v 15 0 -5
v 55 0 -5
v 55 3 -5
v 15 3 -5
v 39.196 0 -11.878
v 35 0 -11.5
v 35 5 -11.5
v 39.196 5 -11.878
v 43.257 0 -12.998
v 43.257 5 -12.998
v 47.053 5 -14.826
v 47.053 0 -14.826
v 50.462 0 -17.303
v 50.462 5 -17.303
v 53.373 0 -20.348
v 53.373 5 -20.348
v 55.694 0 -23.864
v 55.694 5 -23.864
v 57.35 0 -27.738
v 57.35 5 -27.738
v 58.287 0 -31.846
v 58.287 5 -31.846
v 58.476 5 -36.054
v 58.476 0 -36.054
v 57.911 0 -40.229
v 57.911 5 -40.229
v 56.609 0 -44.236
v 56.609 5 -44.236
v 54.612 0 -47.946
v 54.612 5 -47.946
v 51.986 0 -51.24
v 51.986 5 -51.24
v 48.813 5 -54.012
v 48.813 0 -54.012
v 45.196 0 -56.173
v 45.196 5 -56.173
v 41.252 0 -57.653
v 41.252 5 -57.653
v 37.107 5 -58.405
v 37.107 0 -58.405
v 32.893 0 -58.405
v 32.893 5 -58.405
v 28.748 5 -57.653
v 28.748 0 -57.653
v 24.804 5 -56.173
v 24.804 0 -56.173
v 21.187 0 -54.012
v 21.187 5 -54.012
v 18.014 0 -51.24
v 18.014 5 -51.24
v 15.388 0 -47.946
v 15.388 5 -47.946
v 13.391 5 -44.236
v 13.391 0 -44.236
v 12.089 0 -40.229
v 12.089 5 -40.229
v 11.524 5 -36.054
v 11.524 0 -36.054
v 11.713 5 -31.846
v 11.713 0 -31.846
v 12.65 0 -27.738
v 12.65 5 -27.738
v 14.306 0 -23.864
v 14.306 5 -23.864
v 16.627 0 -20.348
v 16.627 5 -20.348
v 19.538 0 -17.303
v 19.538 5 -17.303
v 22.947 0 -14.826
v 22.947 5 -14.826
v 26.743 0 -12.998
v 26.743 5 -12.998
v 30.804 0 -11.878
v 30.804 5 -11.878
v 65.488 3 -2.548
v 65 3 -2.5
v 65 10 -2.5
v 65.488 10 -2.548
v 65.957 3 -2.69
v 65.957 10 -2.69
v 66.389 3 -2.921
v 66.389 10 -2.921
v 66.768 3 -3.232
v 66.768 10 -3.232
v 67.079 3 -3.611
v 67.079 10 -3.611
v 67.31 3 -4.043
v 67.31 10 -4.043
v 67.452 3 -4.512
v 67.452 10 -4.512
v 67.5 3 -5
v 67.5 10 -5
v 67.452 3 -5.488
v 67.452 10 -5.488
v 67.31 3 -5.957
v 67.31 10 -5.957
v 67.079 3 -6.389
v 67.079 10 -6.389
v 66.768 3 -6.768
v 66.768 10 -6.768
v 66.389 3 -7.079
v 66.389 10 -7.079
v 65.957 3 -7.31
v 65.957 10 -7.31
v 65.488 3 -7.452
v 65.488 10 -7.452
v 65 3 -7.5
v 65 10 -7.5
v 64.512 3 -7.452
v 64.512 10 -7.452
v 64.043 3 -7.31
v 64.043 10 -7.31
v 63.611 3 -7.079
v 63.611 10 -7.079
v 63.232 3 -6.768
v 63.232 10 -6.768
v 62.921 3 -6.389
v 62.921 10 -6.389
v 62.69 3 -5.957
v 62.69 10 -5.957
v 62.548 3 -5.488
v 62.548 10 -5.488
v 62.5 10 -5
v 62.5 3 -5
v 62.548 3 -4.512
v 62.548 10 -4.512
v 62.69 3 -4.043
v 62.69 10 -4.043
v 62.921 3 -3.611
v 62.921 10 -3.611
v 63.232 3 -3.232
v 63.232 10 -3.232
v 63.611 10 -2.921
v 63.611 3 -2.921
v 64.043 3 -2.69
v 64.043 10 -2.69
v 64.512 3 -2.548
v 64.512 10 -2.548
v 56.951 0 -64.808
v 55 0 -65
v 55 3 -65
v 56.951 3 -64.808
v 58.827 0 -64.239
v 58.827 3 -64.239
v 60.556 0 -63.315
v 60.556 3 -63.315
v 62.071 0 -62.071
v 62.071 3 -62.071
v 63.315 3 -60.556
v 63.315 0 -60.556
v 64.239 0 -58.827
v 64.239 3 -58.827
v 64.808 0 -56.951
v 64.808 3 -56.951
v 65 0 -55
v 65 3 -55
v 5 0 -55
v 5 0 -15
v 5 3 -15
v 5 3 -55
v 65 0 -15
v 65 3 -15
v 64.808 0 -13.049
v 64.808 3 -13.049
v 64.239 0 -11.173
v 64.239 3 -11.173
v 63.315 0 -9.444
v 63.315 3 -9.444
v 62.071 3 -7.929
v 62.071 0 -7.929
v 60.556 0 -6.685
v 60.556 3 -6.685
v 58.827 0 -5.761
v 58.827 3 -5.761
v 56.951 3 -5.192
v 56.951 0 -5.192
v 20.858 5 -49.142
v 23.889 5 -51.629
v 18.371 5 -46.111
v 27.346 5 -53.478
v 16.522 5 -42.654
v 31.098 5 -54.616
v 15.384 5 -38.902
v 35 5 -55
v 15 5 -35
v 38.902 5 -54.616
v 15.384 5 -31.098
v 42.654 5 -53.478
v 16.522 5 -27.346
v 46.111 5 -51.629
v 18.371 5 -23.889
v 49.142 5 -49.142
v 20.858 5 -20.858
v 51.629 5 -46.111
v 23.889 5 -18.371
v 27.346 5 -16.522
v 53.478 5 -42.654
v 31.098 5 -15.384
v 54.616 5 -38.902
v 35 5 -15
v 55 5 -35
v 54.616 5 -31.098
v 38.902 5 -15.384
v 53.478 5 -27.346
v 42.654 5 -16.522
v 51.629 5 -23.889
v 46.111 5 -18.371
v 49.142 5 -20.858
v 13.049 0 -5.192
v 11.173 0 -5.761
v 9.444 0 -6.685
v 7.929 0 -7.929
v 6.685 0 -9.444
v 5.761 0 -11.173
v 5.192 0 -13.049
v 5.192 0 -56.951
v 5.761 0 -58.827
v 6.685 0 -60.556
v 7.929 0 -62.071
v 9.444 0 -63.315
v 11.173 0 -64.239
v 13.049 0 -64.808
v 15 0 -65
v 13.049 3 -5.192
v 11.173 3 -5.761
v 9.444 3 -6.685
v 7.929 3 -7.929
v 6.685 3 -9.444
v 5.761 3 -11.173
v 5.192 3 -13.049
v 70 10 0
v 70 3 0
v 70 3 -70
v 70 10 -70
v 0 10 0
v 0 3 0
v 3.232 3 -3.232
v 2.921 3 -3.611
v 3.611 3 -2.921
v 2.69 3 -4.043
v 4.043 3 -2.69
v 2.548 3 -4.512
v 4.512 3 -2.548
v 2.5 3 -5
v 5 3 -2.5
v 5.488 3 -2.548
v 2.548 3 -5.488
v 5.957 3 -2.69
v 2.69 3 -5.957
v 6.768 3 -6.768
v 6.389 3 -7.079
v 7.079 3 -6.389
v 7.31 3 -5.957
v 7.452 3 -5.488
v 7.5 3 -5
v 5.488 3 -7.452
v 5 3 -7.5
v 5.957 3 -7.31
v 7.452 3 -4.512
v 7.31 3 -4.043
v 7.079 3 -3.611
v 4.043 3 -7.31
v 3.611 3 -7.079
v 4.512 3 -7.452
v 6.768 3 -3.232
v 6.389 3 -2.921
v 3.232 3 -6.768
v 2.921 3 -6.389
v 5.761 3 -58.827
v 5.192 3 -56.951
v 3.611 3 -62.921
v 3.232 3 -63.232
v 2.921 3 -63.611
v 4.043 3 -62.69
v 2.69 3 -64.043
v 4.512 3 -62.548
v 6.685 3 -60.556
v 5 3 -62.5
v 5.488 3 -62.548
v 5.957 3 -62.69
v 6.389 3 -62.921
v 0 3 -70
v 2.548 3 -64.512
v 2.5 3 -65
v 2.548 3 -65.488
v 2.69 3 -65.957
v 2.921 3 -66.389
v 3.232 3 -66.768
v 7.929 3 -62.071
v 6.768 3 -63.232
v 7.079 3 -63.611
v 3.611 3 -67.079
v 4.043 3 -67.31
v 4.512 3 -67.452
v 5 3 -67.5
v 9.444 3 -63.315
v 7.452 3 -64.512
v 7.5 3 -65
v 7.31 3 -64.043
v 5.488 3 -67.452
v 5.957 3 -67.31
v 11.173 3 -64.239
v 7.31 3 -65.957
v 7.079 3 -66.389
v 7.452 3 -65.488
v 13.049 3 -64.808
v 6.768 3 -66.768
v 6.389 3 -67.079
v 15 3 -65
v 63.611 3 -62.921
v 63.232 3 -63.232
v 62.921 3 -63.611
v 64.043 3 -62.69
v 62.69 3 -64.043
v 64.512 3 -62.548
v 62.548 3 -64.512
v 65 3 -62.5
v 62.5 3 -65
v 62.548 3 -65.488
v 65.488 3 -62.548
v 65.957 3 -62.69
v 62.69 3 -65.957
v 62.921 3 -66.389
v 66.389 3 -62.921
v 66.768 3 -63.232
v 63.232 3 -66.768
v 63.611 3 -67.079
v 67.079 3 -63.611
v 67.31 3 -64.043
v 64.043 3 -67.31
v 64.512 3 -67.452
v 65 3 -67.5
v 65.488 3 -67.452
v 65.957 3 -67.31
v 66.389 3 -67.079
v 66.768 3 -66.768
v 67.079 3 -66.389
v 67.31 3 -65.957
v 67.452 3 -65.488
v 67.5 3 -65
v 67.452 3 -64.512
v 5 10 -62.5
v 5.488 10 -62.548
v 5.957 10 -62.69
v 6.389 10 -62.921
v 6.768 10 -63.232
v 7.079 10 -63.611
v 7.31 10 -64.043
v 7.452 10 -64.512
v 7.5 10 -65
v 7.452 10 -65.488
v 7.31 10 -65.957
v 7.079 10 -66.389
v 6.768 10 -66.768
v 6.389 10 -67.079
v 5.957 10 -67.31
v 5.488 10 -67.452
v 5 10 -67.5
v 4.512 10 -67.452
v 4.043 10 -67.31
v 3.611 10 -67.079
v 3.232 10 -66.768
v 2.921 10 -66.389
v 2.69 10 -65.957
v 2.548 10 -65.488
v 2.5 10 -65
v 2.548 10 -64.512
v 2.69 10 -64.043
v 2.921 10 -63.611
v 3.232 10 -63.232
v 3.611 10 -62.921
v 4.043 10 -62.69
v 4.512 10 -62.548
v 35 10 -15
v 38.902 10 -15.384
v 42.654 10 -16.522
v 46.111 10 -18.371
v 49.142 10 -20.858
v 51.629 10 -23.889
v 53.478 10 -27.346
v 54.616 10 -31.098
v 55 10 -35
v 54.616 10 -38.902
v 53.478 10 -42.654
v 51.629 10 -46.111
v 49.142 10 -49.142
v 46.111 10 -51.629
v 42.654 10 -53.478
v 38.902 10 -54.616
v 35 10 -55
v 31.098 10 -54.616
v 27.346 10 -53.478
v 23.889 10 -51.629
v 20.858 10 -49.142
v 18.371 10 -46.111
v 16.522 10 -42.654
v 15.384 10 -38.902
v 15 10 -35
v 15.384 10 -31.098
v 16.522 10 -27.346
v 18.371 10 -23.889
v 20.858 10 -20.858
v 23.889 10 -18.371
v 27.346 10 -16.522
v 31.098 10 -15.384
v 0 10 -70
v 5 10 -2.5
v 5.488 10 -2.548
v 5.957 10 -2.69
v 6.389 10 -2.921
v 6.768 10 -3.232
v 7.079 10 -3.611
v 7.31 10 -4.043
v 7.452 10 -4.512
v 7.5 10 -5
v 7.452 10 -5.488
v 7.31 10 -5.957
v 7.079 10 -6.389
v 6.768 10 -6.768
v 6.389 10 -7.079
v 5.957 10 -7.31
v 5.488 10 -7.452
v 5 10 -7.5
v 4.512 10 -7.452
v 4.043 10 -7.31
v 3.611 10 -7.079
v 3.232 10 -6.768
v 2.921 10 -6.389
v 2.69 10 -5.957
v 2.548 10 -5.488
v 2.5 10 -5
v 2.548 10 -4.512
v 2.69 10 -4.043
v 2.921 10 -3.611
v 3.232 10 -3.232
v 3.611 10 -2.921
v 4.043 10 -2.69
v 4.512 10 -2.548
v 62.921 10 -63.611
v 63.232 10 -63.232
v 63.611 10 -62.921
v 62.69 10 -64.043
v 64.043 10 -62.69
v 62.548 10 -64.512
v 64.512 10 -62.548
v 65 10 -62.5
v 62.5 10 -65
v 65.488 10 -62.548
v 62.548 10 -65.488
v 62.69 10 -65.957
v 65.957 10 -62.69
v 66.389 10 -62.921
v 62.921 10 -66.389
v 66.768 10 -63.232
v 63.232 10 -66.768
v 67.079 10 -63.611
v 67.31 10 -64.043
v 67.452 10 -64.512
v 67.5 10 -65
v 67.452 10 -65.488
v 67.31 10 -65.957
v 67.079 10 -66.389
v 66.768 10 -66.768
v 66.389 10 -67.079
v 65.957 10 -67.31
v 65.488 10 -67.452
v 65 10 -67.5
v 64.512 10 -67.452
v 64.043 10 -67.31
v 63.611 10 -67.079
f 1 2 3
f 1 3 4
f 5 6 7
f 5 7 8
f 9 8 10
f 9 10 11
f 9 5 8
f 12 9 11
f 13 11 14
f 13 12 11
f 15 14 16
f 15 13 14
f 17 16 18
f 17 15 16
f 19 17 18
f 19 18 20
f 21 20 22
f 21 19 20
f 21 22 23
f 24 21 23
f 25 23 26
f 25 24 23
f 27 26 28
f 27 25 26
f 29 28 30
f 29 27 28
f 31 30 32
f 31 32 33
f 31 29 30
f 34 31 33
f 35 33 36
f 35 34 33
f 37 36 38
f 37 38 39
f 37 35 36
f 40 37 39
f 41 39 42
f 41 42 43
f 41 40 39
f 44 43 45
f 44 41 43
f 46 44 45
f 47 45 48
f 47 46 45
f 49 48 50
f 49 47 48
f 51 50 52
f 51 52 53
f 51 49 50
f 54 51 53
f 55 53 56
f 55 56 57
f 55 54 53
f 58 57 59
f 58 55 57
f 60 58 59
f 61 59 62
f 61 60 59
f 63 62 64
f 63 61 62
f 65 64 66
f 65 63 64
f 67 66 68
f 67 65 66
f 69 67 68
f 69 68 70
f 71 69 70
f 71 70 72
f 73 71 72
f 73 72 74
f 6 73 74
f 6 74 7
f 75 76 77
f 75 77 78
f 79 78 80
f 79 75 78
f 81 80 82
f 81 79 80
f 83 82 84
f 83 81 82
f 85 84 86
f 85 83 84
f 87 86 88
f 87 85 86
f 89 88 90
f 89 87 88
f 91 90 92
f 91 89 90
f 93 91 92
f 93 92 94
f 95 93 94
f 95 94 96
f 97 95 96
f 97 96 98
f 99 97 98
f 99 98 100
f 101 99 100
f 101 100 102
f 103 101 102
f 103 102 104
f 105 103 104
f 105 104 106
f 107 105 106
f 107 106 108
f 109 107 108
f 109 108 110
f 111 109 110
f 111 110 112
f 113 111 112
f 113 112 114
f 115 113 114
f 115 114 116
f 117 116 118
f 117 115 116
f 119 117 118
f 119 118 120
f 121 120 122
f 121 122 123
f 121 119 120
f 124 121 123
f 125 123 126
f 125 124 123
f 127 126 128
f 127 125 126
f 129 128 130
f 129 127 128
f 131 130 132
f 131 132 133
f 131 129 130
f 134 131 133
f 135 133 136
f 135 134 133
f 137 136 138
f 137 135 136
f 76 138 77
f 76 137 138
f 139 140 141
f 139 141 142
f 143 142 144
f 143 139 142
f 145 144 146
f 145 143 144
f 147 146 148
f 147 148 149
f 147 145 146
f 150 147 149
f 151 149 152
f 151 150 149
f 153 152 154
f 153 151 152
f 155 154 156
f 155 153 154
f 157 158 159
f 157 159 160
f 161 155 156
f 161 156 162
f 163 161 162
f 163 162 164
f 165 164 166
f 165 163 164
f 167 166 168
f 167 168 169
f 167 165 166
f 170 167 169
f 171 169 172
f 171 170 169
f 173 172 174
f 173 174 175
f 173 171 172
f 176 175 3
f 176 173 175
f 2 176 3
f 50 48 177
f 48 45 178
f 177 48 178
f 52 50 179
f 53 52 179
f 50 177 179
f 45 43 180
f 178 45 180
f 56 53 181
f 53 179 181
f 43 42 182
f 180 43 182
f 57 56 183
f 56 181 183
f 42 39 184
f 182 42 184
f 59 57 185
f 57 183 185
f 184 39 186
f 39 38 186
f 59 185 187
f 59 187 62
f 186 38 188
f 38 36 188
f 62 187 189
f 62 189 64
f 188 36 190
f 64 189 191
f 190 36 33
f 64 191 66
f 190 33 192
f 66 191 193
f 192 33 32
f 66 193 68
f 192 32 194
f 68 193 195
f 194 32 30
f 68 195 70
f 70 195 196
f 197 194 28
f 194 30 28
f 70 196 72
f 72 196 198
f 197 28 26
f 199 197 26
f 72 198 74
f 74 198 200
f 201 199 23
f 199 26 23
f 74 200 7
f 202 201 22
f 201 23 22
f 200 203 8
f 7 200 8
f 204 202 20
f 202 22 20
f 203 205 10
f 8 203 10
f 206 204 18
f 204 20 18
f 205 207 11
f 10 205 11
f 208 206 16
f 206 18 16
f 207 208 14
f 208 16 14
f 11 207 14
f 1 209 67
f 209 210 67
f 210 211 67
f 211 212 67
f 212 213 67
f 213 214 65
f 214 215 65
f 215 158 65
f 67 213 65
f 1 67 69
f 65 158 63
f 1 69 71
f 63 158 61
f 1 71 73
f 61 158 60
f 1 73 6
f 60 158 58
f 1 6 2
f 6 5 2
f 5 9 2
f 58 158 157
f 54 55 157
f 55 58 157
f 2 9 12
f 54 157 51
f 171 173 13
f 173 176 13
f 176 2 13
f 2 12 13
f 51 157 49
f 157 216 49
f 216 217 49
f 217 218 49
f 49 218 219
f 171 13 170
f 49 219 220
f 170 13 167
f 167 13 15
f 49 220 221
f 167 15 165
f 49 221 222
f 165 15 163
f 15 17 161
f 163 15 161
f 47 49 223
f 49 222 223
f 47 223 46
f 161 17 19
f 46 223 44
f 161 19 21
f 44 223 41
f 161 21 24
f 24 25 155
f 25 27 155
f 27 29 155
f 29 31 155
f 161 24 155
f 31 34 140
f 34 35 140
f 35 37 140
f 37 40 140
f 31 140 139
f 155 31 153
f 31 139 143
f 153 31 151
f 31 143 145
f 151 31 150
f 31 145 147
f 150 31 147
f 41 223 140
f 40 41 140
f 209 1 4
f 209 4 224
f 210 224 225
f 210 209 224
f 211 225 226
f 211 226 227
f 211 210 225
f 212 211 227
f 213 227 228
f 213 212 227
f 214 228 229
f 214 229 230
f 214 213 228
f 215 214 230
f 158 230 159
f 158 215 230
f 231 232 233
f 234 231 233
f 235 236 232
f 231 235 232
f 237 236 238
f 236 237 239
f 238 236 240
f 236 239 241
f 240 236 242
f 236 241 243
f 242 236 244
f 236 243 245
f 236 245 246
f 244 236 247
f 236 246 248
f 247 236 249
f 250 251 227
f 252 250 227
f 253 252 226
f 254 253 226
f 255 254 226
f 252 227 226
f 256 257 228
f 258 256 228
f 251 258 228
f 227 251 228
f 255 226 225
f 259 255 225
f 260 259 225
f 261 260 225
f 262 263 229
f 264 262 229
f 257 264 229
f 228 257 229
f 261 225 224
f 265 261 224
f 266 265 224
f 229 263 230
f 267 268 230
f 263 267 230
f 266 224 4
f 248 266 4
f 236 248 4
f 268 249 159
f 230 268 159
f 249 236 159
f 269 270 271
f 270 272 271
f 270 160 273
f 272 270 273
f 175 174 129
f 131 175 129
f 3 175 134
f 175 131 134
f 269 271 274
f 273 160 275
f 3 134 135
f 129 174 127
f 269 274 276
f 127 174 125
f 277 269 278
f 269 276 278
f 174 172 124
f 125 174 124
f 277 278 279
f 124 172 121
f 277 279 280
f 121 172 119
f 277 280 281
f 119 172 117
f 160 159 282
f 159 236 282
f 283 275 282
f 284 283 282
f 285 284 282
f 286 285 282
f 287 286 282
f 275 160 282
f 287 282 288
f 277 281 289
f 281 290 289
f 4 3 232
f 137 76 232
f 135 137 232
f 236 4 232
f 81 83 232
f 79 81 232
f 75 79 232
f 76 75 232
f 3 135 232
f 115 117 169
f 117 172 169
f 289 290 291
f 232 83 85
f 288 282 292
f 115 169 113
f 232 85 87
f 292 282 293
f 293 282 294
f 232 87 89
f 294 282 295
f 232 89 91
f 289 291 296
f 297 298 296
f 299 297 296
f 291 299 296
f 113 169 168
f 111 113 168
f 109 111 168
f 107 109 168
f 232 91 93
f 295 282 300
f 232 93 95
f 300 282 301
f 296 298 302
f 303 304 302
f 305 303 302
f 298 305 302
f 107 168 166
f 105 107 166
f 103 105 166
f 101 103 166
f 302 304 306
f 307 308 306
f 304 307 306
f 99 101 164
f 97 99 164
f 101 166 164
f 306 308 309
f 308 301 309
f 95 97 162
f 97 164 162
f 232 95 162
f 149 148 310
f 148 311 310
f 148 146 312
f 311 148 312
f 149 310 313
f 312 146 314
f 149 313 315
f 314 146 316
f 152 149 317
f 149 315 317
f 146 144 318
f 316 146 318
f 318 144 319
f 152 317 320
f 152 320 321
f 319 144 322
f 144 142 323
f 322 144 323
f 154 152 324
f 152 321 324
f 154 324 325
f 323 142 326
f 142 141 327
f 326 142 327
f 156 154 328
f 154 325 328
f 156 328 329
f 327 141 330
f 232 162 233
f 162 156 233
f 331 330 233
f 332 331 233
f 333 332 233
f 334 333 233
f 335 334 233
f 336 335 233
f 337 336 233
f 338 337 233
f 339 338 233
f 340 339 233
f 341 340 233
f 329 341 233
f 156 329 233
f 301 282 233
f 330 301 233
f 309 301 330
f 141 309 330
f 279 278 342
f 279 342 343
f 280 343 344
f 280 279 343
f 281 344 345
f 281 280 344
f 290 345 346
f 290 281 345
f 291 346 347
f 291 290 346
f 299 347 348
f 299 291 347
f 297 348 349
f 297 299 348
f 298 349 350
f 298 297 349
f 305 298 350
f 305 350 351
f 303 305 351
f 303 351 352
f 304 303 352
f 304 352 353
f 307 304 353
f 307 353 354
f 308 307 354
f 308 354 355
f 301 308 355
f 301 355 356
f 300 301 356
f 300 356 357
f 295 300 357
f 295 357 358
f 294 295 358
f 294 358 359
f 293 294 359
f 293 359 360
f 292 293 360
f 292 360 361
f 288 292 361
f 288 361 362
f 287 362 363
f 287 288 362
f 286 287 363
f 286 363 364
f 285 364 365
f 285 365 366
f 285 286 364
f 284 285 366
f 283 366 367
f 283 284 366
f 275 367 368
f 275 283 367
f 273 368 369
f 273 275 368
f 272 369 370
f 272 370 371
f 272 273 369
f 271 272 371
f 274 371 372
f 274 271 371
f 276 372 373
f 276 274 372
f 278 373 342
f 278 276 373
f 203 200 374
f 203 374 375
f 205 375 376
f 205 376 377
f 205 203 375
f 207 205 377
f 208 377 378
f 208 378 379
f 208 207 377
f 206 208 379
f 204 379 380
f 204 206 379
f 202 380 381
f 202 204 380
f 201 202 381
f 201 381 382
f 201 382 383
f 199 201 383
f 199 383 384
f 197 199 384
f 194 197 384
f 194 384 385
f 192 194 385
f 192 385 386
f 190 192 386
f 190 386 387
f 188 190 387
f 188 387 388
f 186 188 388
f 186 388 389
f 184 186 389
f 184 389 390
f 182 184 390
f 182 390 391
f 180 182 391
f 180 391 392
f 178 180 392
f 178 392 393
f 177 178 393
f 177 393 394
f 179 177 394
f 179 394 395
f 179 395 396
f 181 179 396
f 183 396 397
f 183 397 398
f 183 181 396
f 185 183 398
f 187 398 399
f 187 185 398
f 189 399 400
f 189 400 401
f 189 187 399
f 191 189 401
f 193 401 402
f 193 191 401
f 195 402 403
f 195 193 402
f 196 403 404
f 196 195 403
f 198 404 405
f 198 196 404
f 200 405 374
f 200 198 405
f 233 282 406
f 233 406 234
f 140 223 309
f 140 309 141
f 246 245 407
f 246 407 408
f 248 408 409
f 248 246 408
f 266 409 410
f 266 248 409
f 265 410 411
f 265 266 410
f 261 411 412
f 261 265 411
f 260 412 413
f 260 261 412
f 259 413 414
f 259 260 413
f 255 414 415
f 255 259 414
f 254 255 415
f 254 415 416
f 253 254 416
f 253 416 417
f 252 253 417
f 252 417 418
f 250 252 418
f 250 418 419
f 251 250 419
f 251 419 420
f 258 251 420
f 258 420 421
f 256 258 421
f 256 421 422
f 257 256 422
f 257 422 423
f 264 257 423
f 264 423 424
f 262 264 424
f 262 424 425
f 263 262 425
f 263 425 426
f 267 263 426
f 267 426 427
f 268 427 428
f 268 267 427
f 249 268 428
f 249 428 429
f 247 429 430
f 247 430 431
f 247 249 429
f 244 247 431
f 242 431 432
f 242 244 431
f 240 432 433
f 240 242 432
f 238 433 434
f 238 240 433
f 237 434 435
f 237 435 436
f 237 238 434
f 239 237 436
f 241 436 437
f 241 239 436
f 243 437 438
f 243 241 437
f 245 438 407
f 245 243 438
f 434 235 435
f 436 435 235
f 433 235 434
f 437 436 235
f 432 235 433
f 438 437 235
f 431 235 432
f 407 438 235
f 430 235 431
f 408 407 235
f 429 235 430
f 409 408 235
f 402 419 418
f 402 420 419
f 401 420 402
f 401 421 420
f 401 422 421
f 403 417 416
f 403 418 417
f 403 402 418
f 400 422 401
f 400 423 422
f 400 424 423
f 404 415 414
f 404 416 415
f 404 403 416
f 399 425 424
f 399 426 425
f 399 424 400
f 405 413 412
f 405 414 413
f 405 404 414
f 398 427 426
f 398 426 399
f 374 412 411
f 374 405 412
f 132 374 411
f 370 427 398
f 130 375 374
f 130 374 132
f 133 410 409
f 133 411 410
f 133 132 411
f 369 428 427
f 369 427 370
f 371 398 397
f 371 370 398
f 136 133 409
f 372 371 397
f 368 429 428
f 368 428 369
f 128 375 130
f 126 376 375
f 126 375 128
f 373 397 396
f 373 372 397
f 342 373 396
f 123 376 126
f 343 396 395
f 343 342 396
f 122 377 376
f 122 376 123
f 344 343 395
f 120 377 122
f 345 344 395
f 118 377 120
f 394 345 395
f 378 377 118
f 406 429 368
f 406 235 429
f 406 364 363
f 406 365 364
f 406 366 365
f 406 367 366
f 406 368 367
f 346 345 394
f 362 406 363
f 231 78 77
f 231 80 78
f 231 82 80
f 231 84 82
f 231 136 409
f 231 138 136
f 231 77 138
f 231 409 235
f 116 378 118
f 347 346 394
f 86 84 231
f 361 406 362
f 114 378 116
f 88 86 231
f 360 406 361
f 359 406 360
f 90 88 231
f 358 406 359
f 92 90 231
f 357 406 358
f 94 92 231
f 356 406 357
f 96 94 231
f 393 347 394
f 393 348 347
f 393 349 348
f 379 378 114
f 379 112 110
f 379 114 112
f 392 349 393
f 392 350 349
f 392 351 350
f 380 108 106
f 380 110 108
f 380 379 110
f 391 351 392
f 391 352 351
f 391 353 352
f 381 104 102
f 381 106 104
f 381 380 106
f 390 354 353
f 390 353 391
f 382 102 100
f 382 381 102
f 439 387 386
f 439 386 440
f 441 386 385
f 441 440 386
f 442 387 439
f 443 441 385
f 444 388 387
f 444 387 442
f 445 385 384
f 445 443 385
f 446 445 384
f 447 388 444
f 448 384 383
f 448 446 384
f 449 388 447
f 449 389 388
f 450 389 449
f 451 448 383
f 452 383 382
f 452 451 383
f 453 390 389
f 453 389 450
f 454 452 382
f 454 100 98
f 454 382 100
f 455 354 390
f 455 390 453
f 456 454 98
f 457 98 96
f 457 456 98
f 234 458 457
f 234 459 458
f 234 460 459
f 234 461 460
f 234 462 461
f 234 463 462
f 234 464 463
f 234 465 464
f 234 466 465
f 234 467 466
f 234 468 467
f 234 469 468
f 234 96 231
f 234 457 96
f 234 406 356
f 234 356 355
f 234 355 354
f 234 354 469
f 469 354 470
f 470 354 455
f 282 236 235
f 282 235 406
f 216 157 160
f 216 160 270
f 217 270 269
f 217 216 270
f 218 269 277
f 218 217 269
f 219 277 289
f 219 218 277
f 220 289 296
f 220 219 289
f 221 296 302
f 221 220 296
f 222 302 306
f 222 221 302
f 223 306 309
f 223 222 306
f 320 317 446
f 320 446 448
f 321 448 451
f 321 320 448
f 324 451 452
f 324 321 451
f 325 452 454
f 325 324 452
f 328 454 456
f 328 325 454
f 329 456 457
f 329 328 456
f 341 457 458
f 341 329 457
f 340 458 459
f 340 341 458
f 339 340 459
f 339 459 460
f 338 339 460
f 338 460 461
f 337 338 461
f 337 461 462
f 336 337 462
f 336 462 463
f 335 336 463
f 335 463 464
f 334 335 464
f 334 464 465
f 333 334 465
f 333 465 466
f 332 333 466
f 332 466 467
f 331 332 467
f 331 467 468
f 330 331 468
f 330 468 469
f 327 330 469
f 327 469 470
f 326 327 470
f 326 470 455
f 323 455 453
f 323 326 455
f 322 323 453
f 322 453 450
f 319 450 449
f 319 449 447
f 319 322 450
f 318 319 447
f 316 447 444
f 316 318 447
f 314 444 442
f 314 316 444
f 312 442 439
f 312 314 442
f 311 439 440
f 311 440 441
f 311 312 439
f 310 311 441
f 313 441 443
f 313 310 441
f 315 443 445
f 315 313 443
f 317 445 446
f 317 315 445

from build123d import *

# Parameters (mm, degrees)
SZKIC1_W                    = 70
SZKIC1_H                    = 70
SZKIC1_R                    = 2.5
SZKIC1_R_2                  = 20
DODANIE_WYCI_GNI_CIE1_DEPTH = 10
SZKIC1_3_W                  = 70
SZKIC1_3_H                  = 70
SZKIC1_3_R                  = 2.5
WYTNIJ_WYCI_GNI_CIE1_DEPTH  = 3
SZKIC1_4_R                  = 23.5
SZKIC1_4_R_2                = 20
WYTNIJ_WYCI_GNI_CIE2_DEPTH  = 5


with BuildPart() as part:
    # Szkic1 → Dodanie-wyciągnięcie1 (new body)
    with BuildSketch(Plane(origin=(0, 0, 0), x_dir=(1, 0, 0), z_dir=(0, 1, 0))):
        with Locations((35, 35)):
            Rectangle(SZKIC1_W, SZKIC1_H)
        with Locations((5, 5)):
            Circle(SZKIC1_R, mode=Mode.SUBTRACT)
        with Locations((65, 5)):
            Circle(SZKIC1_R, mode=Mode.SUBTRACT)
        with Locations((5, 65)):
            Circle(SZKIC1_R, mode=Mode.SUBTRACT)
        with Locations((65, 65)):
            Circle(SZKIC1_R, mode=Mode.SUBTRACT)
        with Locations((35, 35)):
            Circle(SZKIC1_R_2, mode=Mode.SUBTRACT)
    extrude(amount=DODANIE_WYCI_GNI_CIE1_DEPTH)

    # Szkic1<3> → Wytnij-wyciągnięcie1 (cut)
    with BuildSketch(Plane(origin=(0, 0, 0), x_dir=(1, 0, 0), z_dir=(0, 1, 0))):
        with Locations((35, 35)):
            Rectangle(SZKIC1_3_W, SZKIC1_3_H)
        with Locations((5, 5)):
            Circle(SZKIC1_3_R, mode=Mode.SUBTRACT)
        with Locations((65, 5)):
            Circle(SZKIC1_3_R, mode=Mode.SUBTRACT)
        with Locations((5, 65)):
            Circle(SZKIC1_3_R, mode=Mode.SUBTRACT)
        with BuildLine():
            Line((5, 15), (5, 35))
            Line((5, 35), (5, 55))
            ThreePointArc((5, 55), (7.928932188, 62.071067812), (15, 65))
            Line((15, 65), (55, 65))
            ThreePointArc((55, 65), (62.071067812, 62.071067812), (65, 55))
            Line((65, 55), (65, 15))
            ThreePointArc((65, 15), (62.071067812, 7.928932188), (55, 5))
            Line((55, 5), (15, 5))
            ThreePointArc((15, 5), (7.928932188, 7.928932188), (5, 15))
        make_face(mode=Mode.SUBTRACT)
        with Locations((65, 65)):
            Circle(SZKIC1_3_R, mode=Mode.SUBTRACT)
    extrude(amount=WYTNIJ_WYCI_GNI_CIE1_DEPTH, mode=Mode.SUBTRACT)

    # Szkic1<4> → Wytnij-wyciągnięcie2 (cut)
    with BuildSketch(Plane(origin=(0, 0, 0), x_dir=(1, 0, 0), z_dir=(0, 1, 0))):
        with Locations((35, 35)):
            Circle(SZKIC1_4_R)
        with Locations((35, 35)):
            Circle(SZKIC1_4_R_2, mode=Mode.SUBTRACT)
    extrude(amount=WYTNIJ_WYCI_GNI_CIE2_DEPTH, mode=Mode.SUBTRACT)


solid = part.part
